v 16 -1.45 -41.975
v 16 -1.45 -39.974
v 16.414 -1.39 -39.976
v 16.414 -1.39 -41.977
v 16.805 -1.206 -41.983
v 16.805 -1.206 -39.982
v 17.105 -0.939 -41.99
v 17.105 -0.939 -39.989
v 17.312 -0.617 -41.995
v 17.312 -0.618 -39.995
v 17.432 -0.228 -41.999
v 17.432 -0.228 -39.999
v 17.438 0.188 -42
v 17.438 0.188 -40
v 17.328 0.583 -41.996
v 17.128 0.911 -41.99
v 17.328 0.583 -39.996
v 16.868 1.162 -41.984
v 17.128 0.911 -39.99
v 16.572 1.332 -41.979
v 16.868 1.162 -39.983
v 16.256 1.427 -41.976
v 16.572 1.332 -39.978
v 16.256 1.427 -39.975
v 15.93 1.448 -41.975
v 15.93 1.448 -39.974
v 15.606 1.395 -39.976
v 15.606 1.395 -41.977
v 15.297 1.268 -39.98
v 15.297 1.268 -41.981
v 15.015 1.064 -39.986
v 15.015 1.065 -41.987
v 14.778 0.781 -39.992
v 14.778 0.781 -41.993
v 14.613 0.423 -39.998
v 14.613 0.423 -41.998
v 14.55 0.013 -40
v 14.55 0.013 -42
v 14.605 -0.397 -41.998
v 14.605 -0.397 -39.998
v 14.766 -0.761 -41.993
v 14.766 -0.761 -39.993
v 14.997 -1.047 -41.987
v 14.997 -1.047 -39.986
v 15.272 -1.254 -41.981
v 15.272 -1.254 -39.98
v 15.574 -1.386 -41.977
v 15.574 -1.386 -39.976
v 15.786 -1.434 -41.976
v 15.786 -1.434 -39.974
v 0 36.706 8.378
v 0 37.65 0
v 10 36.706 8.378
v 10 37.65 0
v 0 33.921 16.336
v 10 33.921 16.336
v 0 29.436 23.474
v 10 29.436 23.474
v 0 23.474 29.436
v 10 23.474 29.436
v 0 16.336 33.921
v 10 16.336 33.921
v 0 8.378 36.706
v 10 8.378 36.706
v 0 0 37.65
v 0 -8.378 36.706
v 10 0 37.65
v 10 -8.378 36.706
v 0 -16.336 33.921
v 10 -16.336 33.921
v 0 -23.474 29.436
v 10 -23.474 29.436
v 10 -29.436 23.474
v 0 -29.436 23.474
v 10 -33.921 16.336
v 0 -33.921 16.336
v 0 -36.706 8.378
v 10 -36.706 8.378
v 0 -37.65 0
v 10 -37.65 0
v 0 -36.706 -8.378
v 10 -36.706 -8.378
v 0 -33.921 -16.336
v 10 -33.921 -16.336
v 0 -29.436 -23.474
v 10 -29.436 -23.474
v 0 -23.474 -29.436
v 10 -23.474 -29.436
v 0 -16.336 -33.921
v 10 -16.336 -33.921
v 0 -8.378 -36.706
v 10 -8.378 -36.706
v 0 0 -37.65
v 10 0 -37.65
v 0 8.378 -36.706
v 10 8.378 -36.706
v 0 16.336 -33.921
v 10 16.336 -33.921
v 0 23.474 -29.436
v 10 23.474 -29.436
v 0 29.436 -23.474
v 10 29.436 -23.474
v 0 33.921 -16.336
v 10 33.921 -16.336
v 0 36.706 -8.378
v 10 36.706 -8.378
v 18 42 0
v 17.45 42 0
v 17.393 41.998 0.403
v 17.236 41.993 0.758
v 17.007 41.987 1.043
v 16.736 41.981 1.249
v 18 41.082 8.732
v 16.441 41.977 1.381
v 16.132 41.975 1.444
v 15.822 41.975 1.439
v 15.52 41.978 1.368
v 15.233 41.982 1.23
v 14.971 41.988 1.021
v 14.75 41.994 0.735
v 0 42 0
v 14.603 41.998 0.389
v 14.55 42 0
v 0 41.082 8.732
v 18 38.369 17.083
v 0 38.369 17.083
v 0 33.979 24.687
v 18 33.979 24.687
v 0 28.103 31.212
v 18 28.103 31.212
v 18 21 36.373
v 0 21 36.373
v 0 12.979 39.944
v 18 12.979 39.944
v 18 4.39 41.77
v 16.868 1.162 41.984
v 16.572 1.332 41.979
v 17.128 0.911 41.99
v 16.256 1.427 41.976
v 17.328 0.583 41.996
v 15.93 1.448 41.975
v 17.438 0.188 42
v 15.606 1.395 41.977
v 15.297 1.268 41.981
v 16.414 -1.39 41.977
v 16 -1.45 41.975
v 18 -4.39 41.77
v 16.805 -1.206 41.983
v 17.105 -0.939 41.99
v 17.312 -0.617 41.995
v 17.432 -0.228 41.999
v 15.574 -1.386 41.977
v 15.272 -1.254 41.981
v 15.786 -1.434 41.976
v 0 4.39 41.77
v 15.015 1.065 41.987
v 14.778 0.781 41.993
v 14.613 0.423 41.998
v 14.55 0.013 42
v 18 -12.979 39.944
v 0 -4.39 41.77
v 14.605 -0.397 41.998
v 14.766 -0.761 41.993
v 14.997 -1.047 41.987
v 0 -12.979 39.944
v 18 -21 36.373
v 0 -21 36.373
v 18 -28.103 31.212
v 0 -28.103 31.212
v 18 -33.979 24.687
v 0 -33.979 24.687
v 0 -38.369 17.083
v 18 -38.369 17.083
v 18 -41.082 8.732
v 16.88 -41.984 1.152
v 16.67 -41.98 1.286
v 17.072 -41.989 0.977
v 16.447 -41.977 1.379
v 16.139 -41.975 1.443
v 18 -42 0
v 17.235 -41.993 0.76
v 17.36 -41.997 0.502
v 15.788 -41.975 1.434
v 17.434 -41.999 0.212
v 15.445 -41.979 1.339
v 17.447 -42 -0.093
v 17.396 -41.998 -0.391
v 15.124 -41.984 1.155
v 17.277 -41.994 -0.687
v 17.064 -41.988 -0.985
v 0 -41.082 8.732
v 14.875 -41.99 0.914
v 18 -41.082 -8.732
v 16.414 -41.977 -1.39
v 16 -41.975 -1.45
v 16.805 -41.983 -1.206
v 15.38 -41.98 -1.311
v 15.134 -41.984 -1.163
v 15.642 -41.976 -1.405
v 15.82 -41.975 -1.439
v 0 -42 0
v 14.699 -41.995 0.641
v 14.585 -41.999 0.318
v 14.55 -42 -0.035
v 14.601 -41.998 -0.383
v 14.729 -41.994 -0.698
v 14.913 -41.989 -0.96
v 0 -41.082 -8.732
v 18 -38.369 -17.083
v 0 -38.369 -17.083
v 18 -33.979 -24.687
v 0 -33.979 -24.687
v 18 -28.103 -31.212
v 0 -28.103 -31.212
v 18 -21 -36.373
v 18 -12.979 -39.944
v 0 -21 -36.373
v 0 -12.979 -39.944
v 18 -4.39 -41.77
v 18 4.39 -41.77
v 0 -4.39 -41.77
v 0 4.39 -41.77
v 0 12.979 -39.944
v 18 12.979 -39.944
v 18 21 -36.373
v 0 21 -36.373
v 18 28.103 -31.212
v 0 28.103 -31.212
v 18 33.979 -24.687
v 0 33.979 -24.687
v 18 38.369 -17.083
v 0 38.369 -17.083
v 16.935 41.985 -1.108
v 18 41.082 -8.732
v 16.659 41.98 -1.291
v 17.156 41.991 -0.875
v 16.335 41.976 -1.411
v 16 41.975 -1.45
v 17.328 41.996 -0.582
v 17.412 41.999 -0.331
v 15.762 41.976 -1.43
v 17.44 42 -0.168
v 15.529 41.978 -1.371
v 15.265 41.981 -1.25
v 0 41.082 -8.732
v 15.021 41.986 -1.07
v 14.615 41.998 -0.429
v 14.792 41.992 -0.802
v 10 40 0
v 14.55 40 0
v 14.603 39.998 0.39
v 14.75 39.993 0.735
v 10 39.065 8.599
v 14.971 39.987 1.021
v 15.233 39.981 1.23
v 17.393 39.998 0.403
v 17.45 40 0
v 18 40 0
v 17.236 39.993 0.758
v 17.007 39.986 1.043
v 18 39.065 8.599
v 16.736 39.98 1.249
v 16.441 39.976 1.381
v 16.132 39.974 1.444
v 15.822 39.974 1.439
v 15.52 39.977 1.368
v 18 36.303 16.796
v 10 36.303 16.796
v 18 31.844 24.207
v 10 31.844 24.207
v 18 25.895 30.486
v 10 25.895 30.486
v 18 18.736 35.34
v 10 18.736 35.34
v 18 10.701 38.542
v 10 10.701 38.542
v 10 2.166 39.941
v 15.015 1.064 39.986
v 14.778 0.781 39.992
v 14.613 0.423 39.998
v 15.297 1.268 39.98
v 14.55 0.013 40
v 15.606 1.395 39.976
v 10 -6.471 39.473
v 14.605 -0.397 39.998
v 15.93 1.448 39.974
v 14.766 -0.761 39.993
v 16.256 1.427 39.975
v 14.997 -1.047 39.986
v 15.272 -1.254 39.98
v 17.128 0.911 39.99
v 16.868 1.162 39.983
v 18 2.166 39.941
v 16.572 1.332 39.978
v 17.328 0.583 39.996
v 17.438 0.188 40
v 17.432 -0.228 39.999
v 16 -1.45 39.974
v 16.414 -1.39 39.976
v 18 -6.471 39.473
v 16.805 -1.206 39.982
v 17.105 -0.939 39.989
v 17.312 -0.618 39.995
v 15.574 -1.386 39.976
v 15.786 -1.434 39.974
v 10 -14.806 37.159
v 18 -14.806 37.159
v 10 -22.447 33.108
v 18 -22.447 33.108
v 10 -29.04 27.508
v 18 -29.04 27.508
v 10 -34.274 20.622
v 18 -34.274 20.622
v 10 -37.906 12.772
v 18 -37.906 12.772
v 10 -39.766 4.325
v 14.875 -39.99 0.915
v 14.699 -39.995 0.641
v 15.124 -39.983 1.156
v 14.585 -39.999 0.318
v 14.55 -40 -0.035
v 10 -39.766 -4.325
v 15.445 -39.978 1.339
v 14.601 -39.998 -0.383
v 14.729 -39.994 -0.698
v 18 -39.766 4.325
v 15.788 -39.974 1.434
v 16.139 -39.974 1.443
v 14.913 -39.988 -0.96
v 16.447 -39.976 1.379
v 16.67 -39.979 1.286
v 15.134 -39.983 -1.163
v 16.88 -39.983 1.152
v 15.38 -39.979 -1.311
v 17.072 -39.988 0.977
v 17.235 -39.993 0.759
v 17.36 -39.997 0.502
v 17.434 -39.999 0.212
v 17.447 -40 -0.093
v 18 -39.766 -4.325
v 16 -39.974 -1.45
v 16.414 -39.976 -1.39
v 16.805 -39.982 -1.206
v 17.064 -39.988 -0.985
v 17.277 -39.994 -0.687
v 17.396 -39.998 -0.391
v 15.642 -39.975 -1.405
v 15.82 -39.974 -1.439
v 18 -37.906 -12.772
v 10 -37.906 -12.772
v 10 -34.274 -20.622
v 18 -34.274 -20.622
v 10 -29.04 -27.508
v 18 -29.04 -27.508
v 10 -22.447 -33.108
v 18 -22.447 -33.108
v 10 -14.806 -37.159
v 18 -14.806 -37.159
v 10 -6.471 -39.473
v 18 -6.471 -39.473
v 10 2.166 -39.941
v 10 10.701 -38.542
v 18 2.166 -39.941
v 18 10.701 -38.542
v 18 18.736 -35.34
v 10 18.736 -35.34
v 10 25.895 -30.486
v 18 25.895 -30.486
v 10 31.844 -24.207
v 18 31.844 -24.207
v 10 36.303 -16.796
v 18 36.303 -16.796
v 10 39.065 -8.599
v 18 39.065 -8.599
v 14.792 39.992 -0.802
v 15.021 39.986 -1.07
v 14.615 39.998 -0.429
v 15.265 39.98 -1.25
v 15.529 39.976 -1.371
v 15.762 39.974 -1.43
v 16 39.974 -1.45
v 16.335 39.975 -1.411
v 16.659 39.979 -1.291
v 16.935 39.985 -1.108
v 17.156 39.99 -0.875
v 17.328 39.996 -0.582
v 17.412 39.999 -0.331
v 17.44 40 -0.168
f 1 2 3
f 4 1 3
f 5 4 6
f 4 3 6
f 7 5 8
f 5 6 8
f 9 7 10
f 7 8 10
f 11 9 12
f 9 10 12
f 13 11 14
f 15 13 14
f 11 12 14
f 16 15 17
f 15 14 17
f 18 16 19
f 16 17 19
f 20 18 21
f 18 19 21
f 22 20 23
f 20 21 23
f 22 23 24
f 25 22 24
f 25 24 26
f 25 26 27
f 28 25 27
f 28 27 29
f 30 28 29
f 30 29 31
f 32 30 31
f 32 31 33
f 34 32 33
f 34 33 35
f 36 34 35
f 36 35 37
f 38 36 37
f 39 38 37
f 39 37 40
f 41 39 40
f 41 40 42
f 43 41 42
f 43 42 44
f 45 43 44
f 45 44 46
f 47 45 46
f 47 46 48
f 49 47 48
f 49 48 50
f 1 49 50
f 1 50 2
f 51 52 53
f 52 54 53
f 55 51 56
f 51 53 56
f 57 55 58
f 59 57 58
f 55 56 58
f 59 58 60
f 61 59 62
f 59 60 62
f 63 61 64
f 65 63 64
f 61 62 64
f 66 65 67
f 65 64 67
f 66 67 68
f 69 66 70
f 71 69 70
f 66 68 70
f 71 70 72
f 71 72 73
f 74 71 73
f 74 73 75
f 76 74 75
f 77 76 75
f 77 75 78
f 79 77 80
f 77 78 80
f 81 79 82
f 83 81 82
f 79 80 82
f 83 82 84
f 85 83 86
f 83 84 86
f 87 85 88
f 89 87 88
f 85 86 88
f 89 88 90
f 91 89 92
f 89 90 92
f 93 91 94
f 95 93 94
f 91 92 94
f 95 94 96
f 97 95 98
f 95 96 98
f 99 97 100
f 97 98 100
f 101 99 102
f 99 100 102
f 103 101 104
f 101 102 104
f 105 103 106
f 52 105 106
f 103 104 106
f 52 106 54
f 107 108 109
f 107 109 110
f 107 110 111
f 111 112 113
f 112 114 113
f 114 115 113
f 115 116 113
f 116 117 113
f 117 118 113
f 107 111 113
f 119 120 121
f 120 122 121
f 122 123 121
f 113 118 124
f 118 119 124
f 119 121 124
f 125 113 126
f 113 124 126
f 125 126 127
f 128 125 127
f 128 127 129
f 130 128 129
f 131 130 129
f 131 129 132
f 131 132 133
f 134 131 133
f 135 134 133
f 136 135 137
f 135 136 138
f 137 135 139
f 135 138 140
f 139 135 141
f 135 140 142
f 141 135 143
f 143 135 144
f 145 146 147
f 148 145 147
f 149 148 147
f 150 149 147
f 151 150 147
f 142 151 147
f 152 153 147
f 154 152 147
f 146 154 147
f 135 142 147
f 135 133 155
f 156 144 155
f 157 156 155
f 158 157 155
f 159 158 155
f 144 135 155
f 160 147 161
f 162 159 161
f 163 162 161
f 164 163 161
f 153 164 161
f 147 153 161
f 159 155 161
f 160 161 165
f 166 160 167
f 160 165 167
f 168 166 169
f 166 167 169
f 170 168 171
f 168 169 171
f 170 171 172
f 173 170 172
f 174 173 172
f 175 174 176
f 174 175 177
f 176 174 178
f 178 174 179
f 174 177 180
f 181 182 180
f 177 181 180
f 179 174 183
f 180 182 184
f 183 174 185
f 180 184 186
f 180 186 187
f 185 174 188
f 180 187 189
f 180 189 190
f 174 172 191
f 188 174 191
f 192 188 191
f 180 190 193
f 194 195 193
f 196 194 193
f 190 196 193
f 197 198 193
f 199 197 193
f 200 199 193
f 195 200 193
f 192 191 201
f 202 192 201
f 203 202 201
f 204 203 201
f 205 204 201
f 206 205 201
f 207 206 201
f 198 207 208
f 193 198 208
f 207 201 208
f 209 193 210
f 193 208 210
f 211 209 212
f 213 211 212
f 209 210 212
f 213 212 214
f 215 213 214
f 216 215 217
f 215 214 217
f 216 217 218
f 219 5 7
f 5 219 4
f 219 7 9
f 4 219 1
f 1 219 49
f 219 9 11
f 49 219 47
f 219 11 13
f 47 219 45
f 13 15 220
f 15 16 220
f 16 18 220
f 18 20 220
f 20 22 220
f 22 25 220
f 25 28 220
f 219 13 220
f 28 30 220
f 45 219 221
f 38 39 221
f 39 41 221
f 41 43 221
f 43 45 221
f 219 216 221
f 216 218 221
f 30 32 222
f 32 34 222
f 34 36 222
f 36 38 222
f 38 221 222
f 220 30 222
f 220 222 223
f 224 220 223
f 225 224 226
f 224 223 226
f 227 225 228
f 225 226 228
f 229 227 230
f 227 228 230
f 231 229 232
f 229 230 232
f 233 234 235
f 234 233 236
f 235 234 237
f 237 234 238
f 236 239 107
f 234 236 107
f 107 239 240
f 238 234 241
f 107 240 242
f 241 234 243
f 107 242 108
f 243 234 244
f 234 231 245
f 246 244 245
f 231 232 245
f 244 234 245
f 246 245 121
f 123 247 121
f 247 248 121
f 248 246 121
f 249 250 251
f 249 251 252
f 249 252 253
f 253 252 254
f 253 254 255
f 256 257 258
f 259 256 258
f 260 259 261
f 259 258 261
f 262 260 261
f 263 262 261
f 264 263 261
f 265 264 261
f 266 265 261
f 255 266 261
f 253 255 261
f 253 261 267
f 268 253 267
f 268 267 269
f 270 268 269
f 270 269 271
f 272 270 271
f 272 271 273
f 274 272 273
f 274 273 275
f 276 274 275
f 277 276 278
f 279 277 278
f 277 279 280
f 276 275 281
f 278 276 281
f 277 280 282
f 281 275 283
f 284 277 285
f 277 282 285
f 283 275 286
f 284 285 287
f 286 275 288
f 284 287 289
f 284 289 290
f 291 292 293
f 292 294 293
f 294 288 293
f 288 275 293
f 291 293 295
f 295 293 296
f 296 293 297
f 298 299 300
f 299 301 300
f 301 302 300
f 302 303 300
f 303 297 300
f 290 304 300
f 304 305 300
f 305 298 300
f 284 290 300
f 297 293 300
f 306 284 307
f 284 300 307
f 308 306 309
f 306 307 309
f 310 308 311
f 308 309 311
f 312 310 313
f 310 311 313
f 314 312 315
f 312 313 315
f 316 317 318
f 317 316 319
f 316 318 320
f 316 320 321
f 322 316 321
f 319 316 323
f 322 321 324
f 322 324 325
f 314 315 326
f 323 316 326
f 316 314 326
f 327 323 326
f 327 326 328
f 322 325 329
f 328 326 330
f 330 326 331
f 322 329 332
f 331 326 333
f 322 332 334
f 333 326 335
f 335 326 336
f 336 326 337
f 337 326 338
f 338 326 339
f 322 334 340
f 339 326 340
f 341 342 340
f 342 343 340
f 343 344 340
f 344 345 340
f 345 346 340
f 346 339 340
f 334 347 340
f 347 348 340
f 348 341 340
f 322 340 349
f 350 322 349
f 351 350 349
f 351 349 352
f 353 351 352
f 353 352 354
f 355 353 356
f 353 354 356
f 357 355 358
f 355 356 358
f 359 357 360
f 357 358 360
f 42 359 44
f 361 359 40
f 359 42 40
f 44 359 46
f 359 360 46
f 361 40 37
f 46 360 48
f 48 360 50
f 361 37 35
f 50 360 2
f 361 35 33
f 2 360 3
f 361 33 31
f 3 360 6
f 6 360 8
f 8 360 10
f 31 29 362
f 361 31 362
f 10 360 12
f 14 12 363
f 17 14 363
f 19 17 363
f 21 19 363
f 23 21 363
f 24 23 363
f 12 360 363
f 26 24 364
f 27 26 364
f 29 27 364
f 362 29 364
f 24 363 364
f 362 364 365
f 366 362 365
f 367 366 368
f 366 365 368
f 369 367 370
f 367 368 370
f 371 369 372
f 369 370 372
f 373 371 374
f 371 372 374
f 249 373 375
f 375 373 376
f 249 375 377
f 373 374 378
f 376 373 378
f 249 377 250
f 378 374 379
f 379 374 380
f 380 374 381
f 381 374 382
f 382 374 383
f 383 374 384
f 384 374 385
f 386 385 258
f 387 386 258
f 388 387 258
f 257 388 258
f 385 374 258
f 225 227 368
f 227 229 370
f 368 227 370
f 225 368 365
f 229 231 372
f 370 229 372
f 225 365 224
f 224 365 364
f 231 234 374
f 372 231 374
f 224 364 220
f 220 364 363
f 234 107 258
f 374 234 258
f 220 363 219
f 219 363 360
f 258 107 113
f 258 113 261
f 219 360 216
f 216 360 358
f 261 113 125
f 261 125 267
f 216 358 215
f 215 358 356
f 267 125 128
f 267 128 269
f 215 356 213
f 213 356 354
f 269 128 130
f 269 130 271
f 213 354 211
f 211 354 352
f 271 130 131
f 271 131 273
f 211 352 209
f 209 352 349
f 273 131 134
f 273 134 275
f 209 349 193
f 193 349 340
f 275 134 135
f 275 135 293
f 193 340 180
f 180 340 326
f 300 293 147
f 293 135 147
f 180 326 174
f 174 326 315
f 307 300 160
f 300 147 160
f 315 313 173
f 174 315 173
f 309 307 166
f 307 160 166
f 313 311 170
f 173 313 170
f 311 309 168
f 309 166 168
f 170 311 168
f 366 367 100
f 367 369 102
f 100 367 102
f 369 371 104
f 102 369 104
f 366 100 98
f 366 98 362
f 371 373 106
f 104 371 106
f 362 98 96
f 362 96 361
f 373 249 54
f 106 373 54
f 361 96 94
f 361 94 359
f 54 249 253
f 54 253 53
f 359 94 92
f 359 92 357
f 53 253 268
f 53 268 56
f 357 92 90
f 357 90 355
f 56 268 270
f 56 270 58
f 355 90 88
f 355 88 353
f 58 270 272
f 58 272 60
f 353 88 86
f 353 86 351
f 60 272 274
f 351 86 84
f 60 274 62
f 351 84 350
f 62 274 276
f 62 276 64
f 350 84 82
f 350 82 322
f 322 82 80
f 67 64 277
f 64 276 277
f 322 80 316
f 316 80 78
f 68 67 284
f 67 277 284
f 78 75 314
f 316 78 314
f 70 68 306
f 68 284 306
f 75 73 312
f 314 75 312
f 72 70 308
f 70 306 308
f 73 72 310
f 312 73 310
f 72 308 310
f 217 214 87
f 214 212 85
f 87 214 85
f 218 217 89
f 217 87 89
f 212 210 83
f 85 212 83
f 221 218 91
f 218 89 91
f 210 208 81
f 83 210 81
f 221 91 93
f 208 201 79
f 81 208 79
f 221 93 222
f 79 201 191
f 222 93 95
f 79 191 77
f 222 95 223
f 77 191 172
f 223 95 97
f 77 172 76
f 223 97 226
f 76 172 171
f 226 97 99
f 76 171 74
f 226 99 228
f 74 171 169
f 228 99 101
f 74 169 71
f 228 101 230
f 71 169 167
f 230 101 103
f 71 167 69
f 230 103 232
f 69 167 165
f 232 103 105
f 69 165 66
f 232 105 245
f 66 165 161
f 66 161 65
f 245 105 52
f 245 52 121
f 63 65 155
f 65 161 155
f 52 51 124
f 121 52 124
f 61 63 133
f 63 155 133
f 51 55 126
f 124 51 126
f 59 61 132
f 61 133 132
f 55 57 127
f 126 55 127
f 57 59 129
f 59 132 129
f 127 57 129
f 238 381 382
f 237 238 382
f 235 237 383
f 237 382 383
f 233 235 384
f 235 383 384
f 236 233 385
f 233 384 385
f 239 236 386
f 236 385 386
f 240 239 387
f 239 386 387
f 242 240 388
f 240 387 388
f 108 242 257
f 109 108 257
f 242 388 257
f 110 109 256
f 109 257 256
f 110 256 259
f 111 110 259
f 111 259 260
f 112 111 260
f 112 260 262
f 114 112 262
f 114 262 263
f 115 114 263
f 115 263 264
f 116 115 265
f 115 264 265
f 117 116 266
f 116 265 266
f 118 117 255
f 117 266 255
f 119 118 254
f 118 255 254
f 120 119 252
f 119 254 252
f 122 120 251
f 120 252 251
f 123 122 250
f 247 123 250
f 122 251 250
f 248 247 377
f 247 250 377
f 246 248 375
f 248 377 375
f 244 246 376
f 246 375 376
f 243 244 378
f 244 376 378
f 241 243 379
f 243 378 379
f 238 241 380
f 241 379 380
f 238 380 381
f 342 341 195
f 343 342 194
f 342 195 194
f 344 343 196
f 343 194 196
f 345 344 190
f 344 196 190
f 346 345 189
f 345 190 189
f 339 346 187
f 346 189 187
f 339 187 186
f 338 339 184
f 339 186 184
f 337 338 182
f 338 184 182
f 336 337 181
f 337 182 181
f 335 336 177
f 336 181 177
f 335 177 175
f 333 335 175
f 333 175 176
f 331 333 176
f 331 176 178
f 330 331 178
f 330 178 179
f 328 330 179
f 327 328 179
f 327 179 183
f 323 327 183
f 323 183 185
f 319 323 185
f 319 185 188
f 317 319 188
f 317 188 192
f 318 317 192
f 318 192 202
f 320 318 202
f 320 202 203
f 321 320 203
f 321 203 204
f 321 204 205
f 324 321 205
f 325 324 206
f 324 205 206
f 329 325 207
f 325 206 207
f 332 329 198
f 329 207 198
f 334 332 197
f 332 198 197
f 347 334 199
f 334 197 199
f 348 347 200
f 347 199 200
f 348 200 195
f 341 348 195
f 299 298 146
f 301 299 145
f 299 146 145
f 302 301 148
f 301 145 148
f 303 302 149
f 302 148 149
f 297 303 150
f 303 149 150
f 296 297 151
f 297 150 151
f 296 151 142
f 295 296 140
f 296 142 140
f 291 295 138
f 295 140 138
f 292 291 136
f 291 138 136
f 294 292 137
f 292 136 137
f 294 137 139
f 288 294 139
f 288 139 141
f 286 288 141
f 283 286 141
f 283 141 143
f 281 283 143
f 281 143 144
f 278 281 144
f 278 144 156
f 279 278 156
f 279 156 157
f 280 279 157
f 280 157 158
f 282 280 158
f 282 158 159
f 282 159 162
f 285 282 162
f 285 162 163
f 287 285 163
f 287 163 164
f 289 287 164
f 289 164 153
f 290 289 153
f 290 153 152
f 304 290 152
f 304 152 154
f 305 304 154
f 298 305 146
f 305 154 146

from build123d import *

# Parameters (mm, degrees)
D_GAGEMENT_M2_51_D           = 2.9
R_P_TITION_CIRCULAIRE1_COUNT = 2
R_P_TITION_CIRCULAIRE1_ANGLE = 90


with BuildPart() as part:
    # Esquisse1 → Révolution1 (revolve)
    with BuildSketch(Plane.XY):
        Polygon((0, 42), (0, 37.65), (10, 37.65), (10, 40), (18, 40), (18, 42), align=None)
    revolve(axis=Axis((-19.427138361, 0, 0), (1, 0, 0)))

    # Dégagement M2.51 (through all)
    with Locations(Plane(origin=(16, 42, 0), x_dir=(0, 0, 1), z_dir=(0, 1, 0))):
        with Locations((0, 0)):
            d_gagement_m2_51 = Hole(D_GAGEMENT_M2_51_D / 2)

    # Répétition circulaire1: Dégagement M2.51 ×2 about axis
    r_p_tition_circulaire1_axis = Axis((0, 0, 0), (-1, 0, 0))
    for i in range(1, R_P_TITION_CIRCULAIRE1_COUNT):
        add(d_gagement_m2_51.rotate(r_p_tition_circulaire1_axis, i * R_P_TITION_CIRCULAIRE1_ANGLE / (R_P_TITION_CIRCULAIRE1_COUNT - 1)), mode=Mode.SUBTRACT)


solid = part.part
